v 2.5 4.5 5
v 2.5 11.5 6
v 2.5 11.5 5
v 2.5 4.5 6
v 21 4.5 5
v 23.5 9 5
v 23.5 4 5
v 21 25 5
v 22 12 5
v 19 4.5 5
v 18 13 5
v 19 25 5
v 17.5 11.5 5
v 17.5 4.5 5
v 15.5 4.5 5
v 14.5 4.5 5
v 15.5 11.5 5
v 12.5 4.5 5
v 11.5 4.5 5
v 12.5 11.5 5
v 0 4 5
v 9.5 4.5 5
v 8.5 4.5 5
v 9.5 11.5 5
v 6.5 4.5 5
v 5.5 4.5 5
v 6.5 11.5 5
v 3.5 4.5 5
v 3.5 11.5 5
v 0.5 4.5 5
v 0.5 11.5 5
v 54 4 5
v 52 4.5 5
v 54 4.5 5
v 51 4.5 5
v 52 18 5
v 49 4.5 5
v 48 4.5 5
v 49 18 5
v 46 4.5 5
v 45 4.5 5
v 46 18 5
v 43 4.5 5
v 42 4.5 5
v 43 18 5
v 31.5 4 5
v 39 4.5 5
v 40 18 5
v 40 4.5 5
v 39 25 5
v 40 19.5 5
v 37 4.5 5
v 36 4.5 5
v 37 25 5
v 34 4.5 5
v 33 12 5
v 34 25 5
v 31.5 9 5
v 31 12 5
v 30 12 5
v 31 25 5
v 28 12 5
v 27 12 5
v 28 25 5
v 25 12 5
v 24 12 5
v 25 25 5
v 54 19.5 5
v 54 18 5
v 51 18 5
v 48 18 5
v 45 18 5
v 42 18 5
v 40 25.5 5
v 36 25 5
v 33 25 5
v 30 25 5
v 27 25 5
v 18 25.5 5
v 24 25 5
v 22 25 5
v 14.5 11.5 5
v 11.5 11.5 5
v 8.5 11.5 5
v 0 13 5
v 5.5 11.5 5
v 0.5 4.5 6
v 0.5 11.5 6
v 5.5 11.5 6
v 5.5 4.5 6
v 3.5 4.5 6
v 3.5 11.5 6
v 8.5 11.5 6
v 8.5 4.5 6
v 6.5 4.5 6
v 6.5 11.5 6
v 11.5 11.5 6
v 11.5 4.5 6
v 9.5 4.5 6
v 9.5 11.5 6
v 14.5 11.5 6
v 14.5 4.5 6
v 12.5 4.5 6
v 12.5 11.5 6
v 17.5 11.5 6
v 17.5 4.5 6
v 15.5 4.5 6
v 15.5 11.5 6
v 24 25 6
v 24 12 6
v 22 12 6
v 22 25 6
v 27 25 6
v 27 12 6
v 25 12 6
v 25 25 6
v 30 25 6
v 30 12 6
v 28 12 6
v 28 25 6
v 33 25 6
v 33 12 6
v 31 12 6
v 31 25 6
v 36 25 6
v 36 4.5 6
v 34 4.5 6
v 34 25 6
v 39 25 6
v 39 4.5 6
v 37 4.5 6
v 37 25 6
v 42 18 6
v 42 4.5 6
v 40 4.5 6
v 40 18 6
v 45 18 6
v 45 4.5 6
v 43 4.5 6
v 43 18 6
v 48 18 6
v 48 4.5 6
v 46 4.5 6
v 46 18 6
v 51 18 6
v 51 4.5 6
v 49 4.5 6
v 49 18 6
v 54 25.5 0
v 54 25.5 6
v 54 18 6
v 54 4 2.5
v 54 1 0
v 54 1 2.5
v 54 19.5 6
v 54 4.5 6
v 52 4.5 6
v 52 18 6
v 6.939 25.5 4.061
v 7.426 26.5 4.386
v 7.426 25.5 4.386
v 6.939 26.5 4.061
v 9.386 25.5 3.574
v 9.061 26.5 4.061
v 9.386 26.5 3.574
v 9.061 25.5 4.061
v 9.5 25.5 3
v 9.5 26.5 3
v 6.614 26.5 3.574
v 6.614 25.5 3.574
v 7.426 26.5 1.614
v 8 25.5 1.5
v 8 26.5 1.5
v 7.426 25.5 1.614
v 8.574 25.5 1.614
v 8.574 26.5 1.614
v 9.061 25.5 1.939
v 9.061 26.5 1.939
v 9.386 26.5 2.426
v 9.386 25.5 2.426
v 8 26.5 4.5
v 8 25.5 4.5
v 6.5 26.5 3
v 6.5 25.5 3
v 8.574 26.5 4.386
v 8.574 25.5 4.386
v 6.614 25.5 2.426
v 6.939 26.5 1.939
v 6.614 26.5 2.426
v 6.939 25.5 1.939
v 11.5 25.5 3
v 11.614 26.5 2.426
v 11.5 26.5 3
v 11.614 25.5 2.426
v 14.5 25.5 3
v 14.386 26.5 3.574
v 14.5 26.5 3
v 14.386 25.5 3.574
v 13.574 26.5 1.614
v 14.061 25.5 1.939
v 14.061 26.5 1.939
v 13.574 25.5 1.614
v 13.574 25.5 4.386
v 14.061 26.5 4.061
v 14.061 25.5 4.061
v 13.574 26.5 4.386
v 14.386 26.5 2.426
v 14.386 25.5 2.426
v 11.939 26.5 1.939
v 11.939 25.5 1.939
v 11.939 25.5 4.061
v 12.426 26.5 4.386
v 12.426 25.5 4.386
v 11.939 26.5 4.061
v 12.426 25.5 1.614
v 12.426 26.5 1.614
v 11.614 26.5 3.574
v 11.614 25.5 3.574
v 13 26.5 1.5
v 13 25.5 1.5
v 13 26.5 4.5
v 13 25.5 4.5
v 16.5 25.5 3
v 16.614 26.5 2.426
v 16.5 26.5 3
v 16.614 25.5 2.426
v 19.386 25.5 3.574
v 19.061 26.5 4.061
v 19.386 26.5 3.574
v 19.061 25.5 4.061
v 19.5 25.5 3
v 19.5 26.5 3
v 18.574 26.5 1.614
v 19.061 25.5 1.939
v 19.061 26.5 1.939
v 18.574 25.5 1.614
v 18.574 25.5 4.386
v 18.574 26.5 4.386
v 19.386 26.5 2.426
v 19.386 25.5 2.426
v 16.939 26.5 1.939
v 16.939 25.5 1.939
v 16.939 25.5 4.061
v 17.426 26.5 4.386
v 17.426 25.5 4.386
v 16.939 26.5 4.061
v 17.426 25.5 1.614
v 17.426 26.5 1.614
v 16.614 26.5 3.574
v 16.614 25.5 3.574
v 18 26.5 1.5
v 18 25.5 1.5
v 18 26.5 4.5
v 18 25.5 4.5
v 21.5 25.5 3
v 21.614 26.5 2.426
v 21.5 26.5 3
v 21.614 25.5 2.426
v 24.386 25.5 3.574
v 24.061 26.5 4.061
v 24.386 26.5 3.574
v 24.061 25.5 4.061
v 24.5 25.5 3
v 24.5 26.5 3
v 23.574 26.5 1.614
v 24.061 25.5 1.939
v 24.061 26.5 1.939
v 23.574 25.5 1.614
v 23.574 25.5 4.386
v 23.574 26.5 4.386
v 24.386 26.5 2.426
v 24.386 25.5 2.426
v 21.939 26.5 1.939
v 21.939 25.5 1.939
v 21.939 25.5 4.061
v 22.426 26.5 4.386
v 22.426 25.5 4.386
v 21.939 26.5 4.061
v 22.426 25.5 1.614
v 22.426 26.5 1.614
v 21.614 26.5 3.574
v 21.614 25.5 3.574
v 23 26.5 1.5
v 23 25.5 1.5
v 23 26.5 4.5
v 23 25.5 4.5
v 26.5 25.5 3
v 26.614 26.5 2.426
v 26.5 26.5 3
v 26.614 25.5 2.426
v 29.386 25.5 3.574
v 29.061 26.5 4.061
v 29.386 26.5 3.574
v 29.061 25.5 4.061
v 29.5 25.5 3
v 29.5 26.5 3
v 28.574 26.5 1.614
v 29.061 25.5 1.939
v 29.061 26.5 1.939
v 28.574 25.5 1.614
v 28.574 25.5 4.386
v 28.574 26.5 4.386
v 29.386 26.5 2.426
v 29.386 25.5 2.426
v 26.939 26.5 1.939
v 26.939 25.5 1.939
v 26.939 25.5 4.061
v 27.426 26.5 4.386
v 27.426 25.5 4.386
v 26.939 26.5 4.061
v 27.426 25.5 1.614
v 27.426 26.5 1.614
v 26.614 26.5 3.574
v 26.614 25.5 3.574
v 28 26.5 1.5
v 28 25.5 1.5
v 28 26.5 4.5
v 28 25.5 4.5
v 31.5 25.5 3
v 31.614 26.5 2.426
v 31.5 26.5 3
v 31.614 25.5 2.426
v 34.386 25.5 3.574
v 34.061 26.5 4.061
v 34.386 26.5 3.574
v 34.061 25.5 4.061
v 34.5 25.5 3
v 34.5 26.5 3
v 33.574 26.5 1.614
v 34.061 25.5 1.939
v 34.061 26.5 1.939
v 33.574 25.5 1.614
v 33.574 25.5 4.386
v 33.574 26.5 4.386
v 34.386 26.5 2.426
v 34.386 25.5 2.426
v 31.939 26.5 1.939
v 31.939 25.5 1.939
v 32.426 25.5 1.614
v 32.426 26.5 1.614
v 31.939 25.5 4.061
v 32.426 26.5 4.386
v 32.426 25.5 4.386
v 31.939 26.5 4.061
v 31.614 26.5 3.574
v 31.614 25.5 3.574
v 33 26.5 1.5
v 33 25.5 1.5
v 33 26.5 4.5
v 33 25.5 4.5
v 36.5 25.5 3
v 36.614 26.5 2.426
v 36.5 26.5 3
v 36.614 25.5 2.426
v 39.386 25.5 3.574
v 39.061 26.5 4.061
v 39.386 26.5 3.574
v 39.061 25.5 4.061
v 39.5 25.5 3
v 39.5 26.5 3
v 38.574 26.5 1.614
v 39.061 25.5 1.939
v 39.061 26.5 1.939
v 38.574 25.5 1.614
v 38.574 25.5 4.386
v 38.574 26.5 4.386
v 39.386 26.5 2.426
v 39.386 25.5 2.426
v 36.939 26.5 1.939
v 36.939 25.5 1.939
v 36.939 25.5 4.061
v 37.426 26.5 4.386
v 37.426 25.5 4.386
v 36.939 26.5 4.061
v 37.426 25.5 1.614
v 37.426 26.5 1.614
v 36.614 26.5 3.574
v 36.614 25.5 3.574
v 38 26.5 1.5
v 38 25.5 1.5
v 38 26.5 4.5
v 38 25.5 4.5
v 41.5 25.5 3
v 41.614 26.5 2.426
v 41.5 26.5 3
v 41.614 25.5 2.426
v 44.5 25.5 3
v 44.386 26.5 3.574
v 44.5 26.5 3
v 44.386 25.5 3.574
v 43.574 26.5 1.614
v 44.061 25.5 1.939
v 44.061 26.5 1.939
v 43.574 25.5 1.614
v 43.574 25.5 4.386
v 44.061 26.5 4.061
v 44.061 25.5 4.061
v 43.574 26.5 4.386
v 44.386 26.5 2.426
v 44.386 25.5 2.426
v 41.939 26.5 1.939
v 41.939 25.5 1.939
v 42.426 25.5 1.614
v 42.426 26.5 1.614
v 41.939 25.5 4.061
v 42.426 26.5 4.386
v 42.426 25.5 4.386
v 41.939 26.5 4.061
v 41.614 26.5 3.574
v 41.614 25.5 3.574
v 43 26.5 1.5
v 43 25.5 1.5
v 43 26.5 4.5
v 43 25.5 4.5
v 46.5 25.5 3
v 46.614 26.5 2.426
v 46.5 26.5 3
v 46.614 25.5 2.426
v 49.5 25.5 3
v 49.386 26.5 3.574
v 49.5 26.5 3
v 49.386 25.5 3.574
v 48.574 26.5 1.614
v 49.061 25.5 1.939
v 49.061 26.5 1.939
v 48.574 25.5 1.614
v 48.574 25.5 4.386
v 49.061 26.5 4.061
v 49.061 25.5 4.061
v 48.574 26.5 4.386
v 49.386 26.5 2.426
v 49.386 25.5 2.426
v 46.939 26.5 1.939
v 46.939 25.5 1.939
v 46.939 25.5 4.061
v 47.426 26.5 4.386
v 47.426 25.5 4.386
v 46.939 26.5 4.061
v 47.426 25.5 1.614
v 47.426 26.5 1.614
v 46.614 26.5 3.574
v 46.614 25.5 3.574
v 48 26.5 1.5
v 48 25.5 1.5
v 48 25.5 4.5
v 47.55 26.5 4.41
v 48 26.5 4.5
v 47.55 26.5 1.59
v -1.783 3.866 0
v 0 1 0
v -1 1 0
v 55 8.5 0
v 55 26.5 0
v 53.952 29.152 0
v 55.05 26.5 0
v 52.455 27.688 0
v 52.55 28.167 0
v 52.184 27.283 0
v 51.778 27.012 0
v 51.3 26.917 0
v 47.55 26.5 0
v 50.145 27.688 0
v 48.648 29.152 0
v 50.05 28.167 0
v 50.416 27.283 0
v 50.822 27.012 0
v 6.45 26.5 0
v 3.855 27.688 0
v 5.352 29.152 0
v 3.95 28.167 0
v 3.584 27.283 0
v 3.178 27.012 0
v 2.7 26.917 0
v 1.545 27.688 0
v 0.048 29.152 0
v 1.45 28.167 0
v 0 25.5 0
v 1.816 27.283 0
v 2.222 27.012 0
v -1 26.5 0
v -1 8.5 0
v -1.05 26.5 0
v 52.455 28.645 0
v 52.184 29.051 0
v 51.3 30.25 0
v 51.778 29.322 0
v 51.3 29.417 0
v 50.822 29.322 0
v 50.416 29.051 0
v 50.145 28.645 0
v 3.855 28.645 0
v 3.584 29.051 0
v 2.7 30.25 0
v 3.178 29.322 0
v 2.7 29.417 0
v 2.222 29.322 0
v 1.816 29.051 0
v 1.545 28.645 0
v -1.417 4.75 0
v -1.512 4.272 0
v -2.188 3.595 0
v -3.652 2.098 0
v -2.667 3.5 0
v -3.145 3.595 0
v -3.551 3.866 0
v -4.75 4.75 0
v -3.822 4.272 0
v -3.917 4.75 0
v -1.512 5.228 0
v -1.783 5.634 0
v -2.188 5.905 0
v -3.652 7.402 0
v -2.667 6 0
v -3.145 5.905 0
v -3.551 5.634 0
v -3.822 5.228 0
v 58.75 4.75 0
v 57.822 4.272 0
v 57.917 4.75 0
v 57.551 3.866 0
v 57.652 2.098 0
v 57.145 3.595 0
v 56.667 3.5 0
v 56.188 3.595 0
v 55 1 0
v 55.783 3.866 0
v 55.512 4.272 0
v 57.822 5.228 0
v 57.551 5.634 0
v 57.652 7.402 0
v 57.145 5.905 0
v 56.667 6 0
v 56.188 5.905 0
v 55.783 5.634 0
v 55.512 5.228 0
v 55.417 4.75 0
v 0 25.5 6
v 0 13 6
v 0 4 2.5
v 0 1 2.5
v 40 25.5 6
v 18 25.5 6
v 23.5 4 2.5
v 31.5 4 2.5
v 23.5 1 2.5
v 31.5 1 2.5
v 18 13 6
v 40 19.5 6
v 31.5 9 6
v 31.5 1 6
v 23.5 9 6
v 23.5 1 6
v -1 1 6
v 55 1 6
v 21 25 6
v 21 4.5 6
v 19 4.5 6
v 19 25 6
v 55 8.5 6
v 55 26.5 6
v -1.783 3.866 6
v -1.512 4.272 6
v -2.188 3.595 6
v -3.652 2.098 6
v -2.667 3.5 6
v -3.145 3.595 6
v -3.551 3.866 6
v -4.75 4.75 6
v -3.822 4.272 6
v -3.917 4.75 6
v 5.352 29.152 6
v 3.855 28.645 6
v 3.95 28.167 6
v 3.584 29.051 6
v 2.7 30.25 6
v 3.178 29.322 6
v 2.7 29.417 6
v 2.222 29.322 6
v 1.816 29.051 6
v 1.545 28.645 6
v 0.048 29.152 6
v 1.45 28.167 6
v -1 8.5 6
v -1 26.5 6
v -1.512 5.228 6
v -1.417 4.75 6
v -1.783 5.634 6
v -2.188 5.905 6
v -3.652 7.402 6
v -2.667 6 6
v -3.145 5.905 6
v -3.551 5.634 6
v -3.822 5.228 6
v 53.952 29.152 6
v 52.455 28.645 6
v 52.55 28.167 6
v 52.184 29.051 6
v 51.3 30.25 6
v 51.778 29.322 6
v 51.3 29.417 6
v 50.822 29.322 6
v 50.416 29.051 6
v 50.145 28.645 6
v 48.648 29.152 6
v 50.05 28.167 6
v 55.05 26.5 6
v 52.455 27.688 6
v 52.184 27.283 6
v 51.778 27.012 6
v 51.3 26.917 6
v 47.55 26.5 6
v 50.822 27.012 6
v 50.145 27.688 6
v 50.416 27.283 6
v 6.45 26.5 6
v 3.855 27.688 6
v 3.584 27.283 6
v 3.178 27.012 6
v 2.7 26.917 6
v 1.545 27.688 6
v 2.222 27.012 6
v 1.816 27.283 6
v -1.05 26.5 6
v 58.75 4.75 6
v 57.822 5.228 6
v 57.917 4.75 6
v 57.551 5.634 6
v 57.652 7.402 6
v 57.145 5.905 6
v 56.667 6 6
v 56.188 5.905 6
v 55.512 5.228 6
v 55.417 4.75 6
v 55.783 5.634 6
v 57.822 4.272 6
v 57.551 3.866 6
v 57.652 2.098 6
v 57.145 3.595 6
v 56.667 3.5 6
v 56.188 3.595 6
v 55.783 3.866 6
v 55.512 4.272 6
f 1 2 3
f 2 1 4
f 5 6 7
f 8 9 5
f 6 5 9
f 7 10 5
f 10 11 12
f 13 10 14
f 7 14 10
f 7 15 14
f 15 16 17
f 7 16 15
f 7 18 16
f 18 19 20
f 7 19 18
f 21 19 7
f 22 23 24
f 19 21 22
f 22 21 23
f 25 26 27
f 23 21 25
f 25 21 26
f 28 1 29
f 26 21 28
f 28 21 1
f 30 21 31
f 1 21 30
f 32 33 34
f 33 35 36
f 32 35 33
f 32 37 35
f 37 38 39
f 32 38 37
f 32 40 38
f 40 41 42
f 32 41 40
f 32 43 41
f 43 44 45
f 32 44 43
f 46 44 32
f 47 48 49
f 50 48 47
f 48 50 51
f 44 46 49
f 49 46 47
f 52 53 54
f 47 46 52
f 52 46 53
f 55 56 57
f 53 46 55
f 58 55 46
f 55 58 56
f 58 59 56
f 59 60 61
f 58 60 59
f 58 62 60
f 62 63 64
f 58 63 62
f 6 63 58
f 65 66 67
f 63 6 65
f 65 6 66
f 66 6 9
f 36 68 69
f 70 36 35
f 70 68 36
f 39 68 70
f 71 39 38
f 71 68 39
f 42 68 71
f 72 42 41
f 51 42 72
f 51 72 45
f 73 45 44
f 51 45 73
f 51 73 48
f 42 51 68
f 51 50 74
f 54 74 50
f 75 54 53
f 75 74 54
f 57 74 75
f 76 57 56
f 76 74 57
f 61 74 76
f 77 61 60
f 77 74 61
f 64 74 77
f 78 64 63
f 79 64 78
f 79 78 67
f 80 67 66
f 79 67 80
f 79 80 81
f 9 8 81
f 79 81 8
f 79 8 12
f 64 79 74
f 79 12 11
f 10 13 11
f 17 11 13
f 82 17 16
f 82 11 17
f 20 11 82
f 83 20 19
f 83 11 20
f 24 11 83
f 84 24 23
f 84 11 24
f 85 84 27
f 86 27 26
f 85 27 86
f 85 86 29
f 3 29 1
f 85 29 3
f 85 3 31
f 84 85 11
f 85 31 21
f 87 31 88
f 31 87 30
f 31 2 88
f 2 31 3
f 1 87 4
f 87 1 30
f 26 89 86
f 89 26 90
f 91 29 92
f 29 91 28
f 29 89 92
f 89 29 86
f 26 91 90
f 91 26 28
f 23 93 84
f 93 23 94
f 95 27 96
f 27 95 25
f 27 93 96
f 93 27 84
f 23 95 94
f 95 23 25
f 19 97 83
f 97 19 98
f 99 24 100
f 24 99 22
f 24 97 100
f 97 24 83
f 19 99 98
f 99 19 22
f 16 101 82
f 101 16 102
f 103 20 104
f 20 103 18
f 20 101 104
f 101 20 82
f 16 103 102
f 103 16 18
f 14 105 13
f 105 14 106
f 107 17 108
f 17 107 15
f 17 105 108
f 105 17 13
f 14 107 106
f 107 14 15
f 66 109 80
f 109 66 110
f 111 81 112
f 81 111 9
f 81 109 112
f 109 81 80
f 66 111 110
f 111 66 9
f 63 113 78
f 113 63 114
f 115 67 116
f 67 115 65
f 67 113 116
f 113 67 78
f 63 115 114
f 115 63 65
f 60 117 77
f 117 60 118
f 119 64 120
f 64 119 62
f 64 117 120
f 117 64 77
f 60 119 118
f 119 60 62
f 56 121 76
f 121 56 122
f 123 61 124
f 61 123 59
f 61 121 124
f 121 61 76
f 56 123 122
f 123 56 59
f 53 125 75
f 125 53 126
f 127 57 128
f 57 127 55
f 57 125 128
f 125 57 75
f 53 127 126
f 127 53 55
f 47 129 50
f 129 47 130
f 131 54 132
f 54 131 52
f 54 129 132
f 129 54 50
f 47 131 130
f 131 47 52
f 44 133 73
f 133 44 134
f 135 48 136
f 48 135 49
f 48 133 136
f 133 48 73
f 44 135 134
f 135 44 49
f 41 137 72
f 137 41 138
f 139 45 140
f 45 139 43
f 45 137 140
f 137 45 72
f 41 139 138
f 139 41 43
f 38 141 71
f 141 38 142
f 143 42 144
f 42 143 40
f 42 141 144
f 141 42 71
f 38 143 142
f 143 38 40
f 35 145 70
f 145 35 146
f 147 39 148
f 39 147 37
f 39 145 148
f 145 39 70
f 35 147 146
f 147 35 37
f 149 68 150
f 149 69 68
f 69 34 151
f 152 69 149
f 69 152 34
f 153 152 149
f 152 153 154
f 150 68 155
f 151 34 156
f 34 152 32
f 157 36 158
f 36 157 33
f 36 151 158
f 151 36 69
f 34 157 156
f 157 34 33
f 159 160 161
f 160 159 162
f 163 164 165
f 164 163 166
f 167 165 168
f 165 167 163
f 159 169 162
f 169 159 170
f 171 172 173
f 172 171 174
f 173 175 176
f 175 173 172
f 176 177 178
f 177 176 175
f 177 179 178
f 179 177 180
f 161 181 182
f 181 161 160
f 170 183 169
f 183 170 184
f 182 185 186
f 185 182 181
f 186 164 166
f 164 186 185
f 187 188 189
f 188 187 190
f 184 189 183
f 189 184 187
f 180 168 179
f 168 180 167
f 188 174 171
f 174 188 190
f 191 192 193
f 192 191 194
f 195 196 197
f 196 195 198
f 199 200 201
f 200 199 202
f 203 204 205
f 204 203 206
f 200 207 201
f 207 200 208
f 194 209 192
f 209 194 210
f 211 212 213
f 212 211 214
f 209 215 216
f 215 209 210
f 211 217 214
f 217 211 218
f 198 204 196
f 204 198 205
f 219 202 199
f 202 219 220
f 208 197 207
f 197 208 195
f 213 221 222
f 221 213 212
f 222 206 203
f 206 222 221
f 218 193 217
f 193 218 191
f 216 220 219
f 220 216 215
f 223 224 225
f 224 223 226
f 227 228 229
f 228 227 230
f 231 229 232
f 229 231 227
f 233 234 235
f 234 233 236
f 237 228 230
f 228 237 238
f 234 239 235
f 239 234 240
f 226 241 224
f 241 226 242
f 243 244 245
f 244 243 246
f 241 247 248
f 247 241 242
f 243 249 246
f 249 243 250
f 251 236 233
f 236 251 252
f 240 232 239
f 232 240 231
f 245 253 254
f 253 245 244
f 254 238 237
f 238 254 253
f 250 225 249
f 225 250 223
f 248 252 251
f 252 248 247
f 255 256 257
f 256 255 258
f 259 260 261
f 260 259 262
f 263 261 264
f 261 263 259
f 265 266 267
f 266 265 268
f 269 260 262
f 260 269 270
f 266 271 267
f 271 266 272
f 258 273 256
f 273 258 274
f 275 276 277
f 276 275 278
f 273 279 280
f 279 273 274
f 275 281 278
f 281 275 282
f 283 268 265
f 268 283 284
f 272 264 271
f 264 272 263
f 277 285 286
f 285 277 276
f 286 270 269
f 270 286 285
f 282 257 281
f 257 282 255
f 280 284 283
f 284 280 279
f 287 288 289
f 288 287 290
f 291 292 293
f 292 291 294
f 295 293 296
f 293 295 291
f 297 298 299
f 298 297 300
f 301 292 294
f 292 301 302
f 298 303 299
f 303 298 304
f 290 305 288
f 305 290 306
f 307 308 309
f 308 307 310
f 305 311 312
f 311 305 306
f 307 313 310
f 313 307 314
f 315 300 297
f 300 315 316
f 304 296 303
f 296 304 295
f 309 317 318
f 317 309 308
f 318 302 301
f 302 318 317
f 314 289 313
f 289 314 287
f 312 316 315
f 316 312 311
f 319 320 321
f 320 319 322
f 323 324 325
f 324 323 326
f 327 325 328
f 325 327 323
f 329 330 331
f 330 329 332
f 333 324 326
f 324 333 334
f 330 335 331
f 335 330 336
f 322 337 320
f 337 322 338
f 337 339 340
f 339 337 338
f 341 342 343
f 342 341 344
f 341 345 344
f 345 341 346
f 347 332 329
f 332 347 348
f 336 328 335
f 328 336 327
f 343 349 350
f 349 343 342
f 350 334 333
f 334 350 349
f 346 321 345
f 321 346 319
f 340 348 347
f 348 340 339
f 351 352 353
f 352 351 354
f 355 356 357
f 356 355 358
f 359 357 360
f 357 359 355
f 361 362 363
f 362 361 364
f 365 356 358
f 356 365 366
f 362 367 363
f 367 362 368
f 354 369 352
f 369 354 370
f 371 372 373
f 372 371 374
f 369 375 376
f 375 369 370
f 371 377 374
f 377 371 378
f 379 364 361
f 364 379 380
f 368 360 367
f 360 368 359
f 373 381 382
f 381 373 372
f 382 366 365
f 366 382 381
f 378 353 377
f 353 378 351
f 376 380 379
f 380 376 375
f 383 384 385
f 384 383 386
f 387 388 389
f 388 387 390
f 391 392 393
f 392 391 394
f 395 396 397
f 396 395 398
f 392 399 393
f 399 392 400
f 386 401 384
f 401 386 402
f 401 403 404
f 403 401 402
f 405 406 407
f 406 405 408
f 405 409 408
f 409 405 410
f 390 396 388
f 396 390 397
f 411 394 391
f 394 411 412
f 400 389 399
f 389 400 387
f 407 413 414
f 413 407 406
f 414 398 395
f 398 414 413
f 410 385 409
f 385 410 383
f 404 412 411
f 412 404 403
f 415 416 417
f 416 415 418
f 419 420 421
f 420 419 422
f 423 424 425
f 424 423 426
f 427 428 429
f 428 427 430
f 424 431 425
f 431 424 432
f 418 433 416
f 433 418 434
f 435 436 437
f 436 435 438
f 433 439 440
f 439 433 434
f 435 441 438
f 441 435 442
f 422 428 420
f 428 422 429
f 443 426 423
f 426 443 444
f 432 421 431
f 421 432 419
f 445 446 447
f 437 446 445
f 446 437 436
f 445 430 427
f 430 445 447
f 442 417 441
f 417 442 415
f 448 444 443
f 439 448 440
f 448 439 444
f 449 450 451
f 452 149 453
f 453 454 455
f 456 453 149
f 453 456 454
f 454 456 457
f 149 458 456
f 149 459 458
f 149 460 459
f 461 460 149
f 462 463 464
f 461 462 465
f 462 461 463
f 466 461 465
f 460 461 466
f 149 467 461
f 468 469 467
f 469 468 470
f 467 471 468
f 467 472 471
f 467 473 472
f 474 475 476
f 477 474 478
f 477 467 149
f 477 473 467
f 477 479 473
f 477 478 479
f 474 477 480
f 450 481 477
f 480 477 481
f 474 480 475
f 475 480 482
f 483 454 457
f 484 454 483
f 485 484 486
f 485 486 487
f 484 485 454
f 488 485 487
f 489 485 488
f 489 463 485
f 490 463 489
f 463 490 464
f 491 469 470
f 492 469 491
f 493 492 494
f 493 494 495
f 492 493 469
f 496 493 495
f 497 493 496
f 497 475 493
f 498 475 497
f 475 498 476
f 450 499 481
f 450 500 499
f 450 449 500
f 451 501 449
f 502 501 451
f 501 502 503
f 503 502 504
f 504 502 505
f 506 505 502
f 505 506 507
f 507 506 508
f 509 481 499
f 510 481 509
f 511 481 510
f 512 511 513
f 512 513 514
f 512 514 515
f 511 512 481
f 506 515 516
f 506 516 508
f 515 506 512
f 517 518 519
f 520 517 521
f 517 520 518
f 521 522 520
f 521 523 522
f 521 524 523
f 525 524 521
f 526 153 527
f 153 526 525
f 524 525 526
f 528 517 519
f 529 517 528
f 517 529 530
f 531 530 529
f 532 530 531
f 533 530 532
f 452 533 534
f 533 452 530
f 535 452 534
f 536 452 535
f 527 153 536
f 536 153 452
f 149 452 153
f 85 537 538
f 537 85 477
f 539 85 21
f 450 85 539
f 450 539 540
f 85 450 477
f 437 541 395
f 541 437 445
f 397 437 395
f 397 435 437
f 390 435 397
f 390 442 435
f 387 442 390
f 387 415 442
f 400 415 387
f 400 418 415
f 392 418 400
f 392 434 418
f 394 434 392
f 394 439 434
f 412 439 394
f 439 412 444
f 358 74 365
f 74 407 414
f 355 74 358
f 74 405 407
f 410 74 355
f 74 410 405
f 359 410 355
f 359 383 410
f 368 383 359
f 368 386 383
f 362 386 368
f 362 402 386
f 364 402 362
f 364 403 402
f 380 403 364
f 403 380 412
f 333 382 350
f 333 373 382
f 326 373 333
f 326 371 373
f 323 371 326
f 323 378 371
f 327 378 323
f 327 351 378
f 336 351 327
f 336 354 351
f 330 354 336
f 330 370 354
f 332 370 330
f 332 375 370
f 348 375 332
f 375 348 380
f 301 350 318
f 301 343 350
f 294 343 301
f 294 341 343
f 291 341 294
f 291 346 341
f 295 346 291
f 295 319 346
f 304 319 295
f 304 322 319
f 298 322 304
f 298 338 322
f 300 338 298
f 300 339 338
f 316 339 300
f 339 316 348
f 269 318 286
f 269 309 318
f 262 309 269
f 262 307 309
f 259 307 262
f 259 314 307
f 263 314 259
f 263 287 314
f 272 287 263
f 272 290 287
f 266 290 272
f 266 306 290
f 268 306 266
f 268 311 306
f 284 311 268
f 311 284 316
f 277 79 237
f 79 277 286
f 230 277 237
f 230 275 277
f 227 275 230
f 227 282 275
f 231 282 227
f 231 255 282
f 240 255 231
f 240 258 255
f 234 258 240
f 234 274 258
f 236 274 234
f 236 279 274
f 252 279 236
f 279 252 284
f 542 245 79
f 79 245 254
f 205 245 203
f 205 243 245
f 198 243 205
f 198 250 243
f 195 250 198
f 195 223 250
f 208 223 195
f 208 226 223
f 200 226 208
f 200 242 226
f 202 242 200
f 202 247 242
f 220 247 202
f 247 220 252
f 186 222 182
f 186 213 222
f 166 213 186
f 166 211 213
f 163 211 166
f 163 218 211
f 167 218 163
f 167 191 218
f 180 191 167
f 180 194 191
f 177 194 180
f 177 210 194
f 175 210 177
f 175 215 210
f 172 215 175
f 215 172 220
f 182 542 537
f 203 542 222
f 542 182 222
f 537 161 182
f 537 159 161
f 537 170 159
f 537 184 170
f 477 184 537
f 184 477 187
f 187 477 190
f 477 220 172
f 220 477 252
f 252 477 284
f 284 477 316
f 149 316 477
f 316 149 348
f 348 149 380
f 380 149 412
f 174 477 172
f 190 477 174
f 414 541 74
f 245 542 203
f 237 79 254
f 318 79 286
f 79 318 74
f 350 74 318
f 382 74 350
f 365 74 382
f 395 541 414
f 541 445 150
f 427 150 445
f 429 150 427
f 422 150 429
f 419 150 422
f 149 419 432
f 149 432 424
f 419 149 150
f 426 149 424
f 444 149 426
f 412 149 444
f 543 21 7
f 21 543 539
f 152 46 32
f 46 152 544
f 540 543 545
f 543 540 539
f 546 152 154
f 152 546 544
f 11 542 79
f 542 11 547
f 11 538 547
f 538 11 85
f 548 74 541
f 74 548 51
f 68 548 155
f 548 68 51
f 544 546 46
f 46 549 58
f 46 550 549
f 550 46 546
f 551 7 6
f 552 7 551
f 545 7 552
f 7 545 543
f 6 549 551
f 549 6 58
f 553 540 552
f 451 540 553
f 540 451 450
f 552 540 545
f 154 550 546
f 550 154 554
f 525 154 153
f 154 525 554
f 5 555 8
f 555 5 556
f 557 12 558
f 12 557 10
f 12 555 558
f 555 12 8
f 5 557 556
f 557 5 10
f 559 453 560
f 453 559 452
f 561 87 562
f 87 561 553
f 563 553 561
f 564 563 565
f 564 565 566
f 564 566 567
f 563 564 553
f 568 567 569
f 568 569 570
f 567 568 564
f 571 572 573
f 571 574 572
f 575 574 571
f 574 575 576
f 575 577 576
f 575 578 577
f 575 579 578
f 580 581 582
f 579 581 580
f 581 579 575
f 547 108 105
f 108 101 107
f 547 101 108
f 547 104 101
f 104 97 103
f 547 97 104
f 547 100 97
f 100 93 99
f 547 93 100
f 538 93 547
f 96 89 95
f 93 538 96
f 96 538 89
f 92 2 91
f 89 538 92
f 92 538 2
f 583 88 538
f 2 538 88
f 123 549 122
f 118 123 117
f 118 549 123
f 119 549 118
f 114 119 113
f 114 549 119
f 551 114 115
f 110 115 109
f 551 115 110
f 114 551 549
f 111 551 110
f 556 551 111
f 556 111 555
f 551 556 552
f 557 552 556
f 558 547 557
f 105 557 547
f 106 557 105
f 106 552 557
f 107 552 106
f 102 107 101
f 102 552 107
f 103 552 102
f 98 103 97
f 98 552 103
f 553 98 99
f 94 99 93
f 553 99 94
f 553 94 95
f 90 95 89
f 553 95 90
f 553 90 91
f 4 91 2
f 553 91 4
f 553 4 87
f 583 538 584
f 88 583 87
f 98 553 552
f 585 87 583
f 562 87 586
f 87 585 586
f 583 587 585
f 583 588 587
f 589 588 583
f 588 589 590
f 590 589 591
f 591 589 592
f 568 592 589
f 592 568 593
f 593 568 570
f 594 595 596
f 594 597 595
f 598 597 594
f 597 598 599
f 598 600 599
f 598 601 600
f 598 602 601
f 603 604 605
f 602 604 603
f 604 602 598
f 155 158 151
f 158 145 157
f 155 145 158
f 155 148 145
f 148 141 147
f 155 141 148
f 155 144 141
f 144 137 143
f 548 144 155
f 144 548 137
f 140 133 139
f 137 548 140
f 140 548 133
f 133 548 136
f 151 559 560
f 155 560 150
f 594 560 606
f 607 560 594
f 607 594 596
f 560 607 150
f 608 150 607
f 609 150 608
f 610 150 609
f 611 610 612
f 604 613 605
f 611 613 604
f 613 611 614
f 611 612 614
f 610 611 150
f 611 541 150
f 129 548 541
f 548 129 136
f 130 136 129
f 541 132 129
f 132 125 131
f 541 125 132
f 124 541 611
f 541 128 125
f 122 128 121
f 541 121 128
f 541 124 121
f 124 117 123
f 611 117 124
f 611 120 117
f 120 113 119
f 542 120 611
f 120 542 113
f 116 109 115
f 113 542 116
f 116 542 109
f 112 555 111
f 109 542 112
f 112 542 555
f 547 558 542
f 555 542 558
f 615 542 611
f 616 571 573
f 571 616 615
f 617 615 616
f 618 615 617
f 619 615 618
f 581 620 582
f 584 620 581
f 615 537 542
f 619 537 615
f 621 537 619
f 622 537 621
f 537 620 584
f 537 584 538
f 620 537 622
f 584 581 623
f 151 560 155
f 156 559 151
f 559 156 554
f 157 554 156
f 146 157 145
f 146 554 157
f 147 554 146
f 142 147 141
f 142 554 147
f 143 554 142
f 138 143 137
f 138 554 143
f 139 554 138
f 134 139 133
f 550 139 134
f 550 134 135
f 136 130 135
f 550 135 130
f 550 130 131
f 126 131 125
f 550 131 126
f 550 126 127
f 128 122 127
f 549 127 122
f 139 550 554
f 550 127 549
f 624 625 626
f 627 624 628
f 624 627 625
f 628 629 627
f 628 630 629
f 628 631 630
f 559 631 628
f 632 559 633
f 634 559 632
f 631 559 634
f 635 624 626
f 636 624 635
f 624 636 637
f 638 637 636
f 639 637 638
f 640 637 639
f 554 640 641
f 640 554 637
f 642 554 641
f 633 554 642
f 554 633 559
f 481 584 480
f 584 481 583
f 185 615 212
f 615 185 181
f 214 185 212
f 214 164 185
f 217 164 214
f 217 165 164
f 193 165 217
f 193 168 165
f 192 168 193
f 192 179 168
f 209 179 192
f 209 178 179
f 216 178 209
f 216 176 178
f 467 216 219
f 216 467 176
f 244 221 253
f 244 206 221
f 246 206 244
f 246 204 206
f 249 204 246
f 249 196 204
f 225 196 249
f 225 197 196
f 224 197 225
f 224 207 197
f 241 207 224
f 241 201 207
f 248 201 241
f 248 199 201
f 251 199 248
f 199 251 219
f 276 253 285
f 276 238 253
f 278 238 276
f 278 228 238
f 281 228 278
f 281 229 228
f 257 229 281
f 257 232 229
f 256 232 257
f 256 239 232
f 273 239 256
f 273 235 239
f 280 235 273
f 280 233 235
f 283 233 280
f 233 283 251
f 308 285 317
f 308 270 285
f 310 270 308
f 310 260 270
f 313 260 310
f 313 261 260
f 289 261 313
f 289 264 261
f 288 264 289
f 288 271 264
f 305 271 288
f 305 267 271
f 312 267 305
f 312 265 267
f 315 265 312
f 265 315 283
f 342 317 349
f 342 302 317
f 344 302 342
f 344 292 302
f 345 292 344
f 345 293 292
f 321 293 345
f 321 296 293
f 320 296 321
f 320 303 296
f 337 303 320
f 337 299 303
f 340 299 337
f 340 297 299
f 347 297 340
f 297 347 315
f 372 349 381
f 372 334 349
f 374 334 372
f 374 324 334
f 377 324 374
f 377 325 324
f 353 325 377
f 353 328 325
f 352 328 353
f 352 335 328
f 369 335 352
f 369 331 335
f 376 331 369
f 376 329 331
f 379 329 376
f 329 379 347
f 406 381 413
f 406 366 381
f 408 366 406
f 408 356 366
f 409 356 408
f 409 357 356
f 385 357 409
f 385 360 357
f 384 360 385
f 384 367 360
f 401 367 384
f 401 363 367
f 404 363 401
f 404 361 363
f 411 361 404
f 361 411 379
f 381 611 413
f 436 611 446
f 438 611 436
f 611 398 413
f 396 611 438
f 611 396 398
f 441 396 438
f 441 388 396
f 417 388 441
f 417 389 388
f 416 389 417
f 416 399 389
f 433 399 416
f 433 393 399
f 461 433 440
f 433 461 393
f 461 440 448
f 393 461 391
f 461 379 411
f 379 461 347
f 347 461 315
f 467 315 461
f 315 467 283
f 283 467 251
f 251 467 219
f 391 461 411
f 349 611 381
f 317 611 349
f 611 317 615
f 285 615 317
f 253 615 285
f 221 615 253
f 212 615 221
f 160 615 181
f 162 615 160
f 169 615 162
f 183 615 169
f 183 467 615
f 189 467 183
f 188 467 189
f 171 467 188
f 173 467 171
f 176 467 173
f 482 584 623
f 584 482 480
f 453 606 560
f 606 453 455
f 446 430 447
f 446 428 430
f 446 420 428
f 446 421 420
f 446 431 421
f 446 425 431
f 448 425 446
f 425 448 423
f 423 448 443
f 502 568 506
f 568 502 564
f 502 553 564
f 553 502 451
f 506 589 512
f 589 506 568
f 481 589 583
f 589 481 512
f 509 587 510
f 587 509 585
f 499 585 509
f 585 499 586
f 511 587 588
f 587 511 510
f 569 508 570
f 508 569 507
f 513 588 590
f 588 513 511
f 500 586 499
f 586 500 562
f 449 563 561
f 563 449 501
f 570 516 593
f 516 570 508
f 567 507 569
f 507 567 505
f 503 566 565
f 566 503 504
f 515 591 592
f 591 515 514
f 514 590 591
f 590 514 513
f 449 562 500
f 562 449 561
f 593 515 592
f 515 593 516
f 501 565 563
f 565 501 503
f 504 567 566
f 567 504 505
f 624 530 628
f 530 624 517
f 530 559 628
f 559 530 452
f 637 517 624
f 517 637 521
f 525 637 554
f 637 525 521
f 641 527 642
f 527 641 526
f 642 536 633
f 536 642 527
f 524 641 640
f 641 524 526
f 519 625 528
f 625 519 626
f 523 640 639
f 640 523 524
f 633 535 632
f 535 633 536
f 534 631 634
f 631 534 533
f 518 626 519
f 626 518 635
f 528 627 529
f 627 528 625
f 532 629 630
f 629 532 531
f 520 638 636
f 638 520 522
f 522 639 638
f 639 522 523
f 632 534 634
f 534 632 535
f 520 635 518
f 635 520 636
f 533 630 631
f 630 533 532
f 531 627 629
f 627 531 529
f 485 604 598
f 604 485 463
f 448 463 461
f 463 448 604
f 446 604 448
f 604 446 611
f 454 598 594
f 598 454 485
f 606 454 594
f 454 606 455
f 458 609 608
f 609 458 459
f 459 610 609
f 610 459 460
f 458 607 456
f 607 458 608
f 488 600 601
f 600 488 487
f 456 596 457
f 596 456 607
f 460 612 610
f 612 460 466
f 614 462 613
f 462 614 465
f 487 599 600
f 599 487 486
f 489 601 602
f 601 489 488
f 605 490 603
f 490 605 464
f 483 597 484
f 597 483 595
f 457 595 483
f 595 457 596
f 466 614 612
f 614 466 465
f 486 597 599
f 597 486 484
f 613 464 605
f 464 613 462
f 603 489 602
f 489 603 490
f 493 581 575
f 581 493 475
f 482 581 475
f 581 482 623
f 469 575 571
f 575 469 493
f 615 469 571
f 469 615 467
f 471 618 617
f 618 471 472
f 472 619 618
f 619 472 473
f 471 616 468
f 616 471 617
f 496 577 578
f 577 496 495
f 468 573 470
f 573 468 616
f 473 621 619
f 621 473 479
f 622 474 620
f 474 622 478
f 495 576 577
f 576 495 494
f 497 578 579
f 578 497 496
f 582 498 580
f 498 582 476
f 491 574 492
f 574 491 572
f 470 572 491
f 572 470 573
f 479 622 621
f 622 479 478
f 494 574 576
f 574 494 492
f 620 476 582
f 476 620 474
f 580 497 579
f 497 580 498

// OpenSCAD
housing_length = 25.5;
housing_width = 56;

module hdd_connector() {
  cube([14,6,10]);
}

module cooling_grille(len, number) {
  for (a =[0:number-1]) {
    translate([a*3,0,0]) cube([2,len,2]);
  }
}

module screw_hole(h=10, hole_d=2.5) {
  difference() {
    cylinder(d=hole_d*3, h=h, $fn=8);
    translate([0,-hole_d*1.5,0]) cube([hole_d*3,hole_d*3,h]);
    translate([-hole_d/1.5,0,0]) cylinder(d=hole_d, h=h, $fn=16);
  }
}

module top_edge_cutouts(dia, number) {
  for (a =[0:number]) {
    spacing = 2;
    translate([(a*dia)+(spacing*a),0,0]) rotate([90,0,0]) cylinder(d=dia, h=3, $fn=16);
  }
}

module side_a() {
  housing_height = 6;

  module pw_in_atx() {
    // way larger than expected so you can thread the power connector through.
    cube([18,12.5,10]);
  }

  module clip() {
    cube([8,8,10]);
  }

  difference() {
    translate([-1,1,0]) cube([housing_width, housing_length, housing_height]);
    union() {
      translate([0,4,0]) cube([54, 21.5, housing_height-1]);
      translate([0,0,0]) cube([54, 5, 2.5]); // clear solder connections
      translate([0,13,0]) pw_in_atx();
      translate([40,19.5,0]) hdd_connector();
      translate([(housing_width/2)-4.5,1,0]) clip();

      translate([0.5,4.5,housing_height-1]) cooling_grille(7,6);
      translate([19,4.5,housing_height-1]) cooling_grille(20.5,1);
      translate([22,12,housing_height-1]) cooling_grille(13,4);
      translate([34,4.5,housing_height-1]) cooling_grille(20.5,2);
      translate([40,4.5,housing_height-1]) cooling_grille(13.5,5);

      // top edge cutouts
      translate([8,housing_length+2,housing_height/2]) {
        top_edge_cutouts(housing_height/2, 8);
      }
    }
  }

  translate([-1.0,4.75,0]) screw_hole(h=housing_height);
  translate([55.0,4.75,0]) rotate([0,0,180]) screw_hole(h=housing_height);
  translate([51.3,26.5,0]) rotate([0,0,270]) screw_hole(h=housing_height);
  translate([2.7,26.5,0]) rotate([0,0,270]) screw_hole(h=housing_height);
}

module side_b() {
  housing_height = 10;

  difference() {
    translate([-1,1,0]) cube([housing_width, housing_length, housing_height]);
    union() {
      translate([0,4,0]) cube([54, 21.5, housing_height-1]);
      translate([0,0,0]) cube([54, 5, 2.5]); // clear solder connections
      translate([0,17,0]) hdd_connector();
      translate([0.5,4.5,housing_height-1]) cooling_grille(11,5);
      translate([15.5,4.5,housing_height-1]) cooling_grille(20,13);
      // top edge cutouts
      translate([9.5,housing_length+2,housing_height/2]) {
        top_edge_cutouts(housing_height/2, 5);
      }

    }
  }

  translate([-1.0,4.75,0]) screw_hole(h=housing_height);
  translate([55.0,4.75,0]) rotate([0,0,180]) screw_hole(h=housing_height);
  // translate([55.0,23.5,0]) rotate([0,0,180]) screw_hole(h=housing_height);
  translate([51.3,26.5,0]) rotate([0,0,270]) screw_hole(h=housing_height);
  translate([2.7,26.5,0]) rotate([0,0,270]) screw_hole(h=housing_height);
}

// rotate([180,0,0])
  side_a();

// rotate([180,0,0])
//  side_b();
